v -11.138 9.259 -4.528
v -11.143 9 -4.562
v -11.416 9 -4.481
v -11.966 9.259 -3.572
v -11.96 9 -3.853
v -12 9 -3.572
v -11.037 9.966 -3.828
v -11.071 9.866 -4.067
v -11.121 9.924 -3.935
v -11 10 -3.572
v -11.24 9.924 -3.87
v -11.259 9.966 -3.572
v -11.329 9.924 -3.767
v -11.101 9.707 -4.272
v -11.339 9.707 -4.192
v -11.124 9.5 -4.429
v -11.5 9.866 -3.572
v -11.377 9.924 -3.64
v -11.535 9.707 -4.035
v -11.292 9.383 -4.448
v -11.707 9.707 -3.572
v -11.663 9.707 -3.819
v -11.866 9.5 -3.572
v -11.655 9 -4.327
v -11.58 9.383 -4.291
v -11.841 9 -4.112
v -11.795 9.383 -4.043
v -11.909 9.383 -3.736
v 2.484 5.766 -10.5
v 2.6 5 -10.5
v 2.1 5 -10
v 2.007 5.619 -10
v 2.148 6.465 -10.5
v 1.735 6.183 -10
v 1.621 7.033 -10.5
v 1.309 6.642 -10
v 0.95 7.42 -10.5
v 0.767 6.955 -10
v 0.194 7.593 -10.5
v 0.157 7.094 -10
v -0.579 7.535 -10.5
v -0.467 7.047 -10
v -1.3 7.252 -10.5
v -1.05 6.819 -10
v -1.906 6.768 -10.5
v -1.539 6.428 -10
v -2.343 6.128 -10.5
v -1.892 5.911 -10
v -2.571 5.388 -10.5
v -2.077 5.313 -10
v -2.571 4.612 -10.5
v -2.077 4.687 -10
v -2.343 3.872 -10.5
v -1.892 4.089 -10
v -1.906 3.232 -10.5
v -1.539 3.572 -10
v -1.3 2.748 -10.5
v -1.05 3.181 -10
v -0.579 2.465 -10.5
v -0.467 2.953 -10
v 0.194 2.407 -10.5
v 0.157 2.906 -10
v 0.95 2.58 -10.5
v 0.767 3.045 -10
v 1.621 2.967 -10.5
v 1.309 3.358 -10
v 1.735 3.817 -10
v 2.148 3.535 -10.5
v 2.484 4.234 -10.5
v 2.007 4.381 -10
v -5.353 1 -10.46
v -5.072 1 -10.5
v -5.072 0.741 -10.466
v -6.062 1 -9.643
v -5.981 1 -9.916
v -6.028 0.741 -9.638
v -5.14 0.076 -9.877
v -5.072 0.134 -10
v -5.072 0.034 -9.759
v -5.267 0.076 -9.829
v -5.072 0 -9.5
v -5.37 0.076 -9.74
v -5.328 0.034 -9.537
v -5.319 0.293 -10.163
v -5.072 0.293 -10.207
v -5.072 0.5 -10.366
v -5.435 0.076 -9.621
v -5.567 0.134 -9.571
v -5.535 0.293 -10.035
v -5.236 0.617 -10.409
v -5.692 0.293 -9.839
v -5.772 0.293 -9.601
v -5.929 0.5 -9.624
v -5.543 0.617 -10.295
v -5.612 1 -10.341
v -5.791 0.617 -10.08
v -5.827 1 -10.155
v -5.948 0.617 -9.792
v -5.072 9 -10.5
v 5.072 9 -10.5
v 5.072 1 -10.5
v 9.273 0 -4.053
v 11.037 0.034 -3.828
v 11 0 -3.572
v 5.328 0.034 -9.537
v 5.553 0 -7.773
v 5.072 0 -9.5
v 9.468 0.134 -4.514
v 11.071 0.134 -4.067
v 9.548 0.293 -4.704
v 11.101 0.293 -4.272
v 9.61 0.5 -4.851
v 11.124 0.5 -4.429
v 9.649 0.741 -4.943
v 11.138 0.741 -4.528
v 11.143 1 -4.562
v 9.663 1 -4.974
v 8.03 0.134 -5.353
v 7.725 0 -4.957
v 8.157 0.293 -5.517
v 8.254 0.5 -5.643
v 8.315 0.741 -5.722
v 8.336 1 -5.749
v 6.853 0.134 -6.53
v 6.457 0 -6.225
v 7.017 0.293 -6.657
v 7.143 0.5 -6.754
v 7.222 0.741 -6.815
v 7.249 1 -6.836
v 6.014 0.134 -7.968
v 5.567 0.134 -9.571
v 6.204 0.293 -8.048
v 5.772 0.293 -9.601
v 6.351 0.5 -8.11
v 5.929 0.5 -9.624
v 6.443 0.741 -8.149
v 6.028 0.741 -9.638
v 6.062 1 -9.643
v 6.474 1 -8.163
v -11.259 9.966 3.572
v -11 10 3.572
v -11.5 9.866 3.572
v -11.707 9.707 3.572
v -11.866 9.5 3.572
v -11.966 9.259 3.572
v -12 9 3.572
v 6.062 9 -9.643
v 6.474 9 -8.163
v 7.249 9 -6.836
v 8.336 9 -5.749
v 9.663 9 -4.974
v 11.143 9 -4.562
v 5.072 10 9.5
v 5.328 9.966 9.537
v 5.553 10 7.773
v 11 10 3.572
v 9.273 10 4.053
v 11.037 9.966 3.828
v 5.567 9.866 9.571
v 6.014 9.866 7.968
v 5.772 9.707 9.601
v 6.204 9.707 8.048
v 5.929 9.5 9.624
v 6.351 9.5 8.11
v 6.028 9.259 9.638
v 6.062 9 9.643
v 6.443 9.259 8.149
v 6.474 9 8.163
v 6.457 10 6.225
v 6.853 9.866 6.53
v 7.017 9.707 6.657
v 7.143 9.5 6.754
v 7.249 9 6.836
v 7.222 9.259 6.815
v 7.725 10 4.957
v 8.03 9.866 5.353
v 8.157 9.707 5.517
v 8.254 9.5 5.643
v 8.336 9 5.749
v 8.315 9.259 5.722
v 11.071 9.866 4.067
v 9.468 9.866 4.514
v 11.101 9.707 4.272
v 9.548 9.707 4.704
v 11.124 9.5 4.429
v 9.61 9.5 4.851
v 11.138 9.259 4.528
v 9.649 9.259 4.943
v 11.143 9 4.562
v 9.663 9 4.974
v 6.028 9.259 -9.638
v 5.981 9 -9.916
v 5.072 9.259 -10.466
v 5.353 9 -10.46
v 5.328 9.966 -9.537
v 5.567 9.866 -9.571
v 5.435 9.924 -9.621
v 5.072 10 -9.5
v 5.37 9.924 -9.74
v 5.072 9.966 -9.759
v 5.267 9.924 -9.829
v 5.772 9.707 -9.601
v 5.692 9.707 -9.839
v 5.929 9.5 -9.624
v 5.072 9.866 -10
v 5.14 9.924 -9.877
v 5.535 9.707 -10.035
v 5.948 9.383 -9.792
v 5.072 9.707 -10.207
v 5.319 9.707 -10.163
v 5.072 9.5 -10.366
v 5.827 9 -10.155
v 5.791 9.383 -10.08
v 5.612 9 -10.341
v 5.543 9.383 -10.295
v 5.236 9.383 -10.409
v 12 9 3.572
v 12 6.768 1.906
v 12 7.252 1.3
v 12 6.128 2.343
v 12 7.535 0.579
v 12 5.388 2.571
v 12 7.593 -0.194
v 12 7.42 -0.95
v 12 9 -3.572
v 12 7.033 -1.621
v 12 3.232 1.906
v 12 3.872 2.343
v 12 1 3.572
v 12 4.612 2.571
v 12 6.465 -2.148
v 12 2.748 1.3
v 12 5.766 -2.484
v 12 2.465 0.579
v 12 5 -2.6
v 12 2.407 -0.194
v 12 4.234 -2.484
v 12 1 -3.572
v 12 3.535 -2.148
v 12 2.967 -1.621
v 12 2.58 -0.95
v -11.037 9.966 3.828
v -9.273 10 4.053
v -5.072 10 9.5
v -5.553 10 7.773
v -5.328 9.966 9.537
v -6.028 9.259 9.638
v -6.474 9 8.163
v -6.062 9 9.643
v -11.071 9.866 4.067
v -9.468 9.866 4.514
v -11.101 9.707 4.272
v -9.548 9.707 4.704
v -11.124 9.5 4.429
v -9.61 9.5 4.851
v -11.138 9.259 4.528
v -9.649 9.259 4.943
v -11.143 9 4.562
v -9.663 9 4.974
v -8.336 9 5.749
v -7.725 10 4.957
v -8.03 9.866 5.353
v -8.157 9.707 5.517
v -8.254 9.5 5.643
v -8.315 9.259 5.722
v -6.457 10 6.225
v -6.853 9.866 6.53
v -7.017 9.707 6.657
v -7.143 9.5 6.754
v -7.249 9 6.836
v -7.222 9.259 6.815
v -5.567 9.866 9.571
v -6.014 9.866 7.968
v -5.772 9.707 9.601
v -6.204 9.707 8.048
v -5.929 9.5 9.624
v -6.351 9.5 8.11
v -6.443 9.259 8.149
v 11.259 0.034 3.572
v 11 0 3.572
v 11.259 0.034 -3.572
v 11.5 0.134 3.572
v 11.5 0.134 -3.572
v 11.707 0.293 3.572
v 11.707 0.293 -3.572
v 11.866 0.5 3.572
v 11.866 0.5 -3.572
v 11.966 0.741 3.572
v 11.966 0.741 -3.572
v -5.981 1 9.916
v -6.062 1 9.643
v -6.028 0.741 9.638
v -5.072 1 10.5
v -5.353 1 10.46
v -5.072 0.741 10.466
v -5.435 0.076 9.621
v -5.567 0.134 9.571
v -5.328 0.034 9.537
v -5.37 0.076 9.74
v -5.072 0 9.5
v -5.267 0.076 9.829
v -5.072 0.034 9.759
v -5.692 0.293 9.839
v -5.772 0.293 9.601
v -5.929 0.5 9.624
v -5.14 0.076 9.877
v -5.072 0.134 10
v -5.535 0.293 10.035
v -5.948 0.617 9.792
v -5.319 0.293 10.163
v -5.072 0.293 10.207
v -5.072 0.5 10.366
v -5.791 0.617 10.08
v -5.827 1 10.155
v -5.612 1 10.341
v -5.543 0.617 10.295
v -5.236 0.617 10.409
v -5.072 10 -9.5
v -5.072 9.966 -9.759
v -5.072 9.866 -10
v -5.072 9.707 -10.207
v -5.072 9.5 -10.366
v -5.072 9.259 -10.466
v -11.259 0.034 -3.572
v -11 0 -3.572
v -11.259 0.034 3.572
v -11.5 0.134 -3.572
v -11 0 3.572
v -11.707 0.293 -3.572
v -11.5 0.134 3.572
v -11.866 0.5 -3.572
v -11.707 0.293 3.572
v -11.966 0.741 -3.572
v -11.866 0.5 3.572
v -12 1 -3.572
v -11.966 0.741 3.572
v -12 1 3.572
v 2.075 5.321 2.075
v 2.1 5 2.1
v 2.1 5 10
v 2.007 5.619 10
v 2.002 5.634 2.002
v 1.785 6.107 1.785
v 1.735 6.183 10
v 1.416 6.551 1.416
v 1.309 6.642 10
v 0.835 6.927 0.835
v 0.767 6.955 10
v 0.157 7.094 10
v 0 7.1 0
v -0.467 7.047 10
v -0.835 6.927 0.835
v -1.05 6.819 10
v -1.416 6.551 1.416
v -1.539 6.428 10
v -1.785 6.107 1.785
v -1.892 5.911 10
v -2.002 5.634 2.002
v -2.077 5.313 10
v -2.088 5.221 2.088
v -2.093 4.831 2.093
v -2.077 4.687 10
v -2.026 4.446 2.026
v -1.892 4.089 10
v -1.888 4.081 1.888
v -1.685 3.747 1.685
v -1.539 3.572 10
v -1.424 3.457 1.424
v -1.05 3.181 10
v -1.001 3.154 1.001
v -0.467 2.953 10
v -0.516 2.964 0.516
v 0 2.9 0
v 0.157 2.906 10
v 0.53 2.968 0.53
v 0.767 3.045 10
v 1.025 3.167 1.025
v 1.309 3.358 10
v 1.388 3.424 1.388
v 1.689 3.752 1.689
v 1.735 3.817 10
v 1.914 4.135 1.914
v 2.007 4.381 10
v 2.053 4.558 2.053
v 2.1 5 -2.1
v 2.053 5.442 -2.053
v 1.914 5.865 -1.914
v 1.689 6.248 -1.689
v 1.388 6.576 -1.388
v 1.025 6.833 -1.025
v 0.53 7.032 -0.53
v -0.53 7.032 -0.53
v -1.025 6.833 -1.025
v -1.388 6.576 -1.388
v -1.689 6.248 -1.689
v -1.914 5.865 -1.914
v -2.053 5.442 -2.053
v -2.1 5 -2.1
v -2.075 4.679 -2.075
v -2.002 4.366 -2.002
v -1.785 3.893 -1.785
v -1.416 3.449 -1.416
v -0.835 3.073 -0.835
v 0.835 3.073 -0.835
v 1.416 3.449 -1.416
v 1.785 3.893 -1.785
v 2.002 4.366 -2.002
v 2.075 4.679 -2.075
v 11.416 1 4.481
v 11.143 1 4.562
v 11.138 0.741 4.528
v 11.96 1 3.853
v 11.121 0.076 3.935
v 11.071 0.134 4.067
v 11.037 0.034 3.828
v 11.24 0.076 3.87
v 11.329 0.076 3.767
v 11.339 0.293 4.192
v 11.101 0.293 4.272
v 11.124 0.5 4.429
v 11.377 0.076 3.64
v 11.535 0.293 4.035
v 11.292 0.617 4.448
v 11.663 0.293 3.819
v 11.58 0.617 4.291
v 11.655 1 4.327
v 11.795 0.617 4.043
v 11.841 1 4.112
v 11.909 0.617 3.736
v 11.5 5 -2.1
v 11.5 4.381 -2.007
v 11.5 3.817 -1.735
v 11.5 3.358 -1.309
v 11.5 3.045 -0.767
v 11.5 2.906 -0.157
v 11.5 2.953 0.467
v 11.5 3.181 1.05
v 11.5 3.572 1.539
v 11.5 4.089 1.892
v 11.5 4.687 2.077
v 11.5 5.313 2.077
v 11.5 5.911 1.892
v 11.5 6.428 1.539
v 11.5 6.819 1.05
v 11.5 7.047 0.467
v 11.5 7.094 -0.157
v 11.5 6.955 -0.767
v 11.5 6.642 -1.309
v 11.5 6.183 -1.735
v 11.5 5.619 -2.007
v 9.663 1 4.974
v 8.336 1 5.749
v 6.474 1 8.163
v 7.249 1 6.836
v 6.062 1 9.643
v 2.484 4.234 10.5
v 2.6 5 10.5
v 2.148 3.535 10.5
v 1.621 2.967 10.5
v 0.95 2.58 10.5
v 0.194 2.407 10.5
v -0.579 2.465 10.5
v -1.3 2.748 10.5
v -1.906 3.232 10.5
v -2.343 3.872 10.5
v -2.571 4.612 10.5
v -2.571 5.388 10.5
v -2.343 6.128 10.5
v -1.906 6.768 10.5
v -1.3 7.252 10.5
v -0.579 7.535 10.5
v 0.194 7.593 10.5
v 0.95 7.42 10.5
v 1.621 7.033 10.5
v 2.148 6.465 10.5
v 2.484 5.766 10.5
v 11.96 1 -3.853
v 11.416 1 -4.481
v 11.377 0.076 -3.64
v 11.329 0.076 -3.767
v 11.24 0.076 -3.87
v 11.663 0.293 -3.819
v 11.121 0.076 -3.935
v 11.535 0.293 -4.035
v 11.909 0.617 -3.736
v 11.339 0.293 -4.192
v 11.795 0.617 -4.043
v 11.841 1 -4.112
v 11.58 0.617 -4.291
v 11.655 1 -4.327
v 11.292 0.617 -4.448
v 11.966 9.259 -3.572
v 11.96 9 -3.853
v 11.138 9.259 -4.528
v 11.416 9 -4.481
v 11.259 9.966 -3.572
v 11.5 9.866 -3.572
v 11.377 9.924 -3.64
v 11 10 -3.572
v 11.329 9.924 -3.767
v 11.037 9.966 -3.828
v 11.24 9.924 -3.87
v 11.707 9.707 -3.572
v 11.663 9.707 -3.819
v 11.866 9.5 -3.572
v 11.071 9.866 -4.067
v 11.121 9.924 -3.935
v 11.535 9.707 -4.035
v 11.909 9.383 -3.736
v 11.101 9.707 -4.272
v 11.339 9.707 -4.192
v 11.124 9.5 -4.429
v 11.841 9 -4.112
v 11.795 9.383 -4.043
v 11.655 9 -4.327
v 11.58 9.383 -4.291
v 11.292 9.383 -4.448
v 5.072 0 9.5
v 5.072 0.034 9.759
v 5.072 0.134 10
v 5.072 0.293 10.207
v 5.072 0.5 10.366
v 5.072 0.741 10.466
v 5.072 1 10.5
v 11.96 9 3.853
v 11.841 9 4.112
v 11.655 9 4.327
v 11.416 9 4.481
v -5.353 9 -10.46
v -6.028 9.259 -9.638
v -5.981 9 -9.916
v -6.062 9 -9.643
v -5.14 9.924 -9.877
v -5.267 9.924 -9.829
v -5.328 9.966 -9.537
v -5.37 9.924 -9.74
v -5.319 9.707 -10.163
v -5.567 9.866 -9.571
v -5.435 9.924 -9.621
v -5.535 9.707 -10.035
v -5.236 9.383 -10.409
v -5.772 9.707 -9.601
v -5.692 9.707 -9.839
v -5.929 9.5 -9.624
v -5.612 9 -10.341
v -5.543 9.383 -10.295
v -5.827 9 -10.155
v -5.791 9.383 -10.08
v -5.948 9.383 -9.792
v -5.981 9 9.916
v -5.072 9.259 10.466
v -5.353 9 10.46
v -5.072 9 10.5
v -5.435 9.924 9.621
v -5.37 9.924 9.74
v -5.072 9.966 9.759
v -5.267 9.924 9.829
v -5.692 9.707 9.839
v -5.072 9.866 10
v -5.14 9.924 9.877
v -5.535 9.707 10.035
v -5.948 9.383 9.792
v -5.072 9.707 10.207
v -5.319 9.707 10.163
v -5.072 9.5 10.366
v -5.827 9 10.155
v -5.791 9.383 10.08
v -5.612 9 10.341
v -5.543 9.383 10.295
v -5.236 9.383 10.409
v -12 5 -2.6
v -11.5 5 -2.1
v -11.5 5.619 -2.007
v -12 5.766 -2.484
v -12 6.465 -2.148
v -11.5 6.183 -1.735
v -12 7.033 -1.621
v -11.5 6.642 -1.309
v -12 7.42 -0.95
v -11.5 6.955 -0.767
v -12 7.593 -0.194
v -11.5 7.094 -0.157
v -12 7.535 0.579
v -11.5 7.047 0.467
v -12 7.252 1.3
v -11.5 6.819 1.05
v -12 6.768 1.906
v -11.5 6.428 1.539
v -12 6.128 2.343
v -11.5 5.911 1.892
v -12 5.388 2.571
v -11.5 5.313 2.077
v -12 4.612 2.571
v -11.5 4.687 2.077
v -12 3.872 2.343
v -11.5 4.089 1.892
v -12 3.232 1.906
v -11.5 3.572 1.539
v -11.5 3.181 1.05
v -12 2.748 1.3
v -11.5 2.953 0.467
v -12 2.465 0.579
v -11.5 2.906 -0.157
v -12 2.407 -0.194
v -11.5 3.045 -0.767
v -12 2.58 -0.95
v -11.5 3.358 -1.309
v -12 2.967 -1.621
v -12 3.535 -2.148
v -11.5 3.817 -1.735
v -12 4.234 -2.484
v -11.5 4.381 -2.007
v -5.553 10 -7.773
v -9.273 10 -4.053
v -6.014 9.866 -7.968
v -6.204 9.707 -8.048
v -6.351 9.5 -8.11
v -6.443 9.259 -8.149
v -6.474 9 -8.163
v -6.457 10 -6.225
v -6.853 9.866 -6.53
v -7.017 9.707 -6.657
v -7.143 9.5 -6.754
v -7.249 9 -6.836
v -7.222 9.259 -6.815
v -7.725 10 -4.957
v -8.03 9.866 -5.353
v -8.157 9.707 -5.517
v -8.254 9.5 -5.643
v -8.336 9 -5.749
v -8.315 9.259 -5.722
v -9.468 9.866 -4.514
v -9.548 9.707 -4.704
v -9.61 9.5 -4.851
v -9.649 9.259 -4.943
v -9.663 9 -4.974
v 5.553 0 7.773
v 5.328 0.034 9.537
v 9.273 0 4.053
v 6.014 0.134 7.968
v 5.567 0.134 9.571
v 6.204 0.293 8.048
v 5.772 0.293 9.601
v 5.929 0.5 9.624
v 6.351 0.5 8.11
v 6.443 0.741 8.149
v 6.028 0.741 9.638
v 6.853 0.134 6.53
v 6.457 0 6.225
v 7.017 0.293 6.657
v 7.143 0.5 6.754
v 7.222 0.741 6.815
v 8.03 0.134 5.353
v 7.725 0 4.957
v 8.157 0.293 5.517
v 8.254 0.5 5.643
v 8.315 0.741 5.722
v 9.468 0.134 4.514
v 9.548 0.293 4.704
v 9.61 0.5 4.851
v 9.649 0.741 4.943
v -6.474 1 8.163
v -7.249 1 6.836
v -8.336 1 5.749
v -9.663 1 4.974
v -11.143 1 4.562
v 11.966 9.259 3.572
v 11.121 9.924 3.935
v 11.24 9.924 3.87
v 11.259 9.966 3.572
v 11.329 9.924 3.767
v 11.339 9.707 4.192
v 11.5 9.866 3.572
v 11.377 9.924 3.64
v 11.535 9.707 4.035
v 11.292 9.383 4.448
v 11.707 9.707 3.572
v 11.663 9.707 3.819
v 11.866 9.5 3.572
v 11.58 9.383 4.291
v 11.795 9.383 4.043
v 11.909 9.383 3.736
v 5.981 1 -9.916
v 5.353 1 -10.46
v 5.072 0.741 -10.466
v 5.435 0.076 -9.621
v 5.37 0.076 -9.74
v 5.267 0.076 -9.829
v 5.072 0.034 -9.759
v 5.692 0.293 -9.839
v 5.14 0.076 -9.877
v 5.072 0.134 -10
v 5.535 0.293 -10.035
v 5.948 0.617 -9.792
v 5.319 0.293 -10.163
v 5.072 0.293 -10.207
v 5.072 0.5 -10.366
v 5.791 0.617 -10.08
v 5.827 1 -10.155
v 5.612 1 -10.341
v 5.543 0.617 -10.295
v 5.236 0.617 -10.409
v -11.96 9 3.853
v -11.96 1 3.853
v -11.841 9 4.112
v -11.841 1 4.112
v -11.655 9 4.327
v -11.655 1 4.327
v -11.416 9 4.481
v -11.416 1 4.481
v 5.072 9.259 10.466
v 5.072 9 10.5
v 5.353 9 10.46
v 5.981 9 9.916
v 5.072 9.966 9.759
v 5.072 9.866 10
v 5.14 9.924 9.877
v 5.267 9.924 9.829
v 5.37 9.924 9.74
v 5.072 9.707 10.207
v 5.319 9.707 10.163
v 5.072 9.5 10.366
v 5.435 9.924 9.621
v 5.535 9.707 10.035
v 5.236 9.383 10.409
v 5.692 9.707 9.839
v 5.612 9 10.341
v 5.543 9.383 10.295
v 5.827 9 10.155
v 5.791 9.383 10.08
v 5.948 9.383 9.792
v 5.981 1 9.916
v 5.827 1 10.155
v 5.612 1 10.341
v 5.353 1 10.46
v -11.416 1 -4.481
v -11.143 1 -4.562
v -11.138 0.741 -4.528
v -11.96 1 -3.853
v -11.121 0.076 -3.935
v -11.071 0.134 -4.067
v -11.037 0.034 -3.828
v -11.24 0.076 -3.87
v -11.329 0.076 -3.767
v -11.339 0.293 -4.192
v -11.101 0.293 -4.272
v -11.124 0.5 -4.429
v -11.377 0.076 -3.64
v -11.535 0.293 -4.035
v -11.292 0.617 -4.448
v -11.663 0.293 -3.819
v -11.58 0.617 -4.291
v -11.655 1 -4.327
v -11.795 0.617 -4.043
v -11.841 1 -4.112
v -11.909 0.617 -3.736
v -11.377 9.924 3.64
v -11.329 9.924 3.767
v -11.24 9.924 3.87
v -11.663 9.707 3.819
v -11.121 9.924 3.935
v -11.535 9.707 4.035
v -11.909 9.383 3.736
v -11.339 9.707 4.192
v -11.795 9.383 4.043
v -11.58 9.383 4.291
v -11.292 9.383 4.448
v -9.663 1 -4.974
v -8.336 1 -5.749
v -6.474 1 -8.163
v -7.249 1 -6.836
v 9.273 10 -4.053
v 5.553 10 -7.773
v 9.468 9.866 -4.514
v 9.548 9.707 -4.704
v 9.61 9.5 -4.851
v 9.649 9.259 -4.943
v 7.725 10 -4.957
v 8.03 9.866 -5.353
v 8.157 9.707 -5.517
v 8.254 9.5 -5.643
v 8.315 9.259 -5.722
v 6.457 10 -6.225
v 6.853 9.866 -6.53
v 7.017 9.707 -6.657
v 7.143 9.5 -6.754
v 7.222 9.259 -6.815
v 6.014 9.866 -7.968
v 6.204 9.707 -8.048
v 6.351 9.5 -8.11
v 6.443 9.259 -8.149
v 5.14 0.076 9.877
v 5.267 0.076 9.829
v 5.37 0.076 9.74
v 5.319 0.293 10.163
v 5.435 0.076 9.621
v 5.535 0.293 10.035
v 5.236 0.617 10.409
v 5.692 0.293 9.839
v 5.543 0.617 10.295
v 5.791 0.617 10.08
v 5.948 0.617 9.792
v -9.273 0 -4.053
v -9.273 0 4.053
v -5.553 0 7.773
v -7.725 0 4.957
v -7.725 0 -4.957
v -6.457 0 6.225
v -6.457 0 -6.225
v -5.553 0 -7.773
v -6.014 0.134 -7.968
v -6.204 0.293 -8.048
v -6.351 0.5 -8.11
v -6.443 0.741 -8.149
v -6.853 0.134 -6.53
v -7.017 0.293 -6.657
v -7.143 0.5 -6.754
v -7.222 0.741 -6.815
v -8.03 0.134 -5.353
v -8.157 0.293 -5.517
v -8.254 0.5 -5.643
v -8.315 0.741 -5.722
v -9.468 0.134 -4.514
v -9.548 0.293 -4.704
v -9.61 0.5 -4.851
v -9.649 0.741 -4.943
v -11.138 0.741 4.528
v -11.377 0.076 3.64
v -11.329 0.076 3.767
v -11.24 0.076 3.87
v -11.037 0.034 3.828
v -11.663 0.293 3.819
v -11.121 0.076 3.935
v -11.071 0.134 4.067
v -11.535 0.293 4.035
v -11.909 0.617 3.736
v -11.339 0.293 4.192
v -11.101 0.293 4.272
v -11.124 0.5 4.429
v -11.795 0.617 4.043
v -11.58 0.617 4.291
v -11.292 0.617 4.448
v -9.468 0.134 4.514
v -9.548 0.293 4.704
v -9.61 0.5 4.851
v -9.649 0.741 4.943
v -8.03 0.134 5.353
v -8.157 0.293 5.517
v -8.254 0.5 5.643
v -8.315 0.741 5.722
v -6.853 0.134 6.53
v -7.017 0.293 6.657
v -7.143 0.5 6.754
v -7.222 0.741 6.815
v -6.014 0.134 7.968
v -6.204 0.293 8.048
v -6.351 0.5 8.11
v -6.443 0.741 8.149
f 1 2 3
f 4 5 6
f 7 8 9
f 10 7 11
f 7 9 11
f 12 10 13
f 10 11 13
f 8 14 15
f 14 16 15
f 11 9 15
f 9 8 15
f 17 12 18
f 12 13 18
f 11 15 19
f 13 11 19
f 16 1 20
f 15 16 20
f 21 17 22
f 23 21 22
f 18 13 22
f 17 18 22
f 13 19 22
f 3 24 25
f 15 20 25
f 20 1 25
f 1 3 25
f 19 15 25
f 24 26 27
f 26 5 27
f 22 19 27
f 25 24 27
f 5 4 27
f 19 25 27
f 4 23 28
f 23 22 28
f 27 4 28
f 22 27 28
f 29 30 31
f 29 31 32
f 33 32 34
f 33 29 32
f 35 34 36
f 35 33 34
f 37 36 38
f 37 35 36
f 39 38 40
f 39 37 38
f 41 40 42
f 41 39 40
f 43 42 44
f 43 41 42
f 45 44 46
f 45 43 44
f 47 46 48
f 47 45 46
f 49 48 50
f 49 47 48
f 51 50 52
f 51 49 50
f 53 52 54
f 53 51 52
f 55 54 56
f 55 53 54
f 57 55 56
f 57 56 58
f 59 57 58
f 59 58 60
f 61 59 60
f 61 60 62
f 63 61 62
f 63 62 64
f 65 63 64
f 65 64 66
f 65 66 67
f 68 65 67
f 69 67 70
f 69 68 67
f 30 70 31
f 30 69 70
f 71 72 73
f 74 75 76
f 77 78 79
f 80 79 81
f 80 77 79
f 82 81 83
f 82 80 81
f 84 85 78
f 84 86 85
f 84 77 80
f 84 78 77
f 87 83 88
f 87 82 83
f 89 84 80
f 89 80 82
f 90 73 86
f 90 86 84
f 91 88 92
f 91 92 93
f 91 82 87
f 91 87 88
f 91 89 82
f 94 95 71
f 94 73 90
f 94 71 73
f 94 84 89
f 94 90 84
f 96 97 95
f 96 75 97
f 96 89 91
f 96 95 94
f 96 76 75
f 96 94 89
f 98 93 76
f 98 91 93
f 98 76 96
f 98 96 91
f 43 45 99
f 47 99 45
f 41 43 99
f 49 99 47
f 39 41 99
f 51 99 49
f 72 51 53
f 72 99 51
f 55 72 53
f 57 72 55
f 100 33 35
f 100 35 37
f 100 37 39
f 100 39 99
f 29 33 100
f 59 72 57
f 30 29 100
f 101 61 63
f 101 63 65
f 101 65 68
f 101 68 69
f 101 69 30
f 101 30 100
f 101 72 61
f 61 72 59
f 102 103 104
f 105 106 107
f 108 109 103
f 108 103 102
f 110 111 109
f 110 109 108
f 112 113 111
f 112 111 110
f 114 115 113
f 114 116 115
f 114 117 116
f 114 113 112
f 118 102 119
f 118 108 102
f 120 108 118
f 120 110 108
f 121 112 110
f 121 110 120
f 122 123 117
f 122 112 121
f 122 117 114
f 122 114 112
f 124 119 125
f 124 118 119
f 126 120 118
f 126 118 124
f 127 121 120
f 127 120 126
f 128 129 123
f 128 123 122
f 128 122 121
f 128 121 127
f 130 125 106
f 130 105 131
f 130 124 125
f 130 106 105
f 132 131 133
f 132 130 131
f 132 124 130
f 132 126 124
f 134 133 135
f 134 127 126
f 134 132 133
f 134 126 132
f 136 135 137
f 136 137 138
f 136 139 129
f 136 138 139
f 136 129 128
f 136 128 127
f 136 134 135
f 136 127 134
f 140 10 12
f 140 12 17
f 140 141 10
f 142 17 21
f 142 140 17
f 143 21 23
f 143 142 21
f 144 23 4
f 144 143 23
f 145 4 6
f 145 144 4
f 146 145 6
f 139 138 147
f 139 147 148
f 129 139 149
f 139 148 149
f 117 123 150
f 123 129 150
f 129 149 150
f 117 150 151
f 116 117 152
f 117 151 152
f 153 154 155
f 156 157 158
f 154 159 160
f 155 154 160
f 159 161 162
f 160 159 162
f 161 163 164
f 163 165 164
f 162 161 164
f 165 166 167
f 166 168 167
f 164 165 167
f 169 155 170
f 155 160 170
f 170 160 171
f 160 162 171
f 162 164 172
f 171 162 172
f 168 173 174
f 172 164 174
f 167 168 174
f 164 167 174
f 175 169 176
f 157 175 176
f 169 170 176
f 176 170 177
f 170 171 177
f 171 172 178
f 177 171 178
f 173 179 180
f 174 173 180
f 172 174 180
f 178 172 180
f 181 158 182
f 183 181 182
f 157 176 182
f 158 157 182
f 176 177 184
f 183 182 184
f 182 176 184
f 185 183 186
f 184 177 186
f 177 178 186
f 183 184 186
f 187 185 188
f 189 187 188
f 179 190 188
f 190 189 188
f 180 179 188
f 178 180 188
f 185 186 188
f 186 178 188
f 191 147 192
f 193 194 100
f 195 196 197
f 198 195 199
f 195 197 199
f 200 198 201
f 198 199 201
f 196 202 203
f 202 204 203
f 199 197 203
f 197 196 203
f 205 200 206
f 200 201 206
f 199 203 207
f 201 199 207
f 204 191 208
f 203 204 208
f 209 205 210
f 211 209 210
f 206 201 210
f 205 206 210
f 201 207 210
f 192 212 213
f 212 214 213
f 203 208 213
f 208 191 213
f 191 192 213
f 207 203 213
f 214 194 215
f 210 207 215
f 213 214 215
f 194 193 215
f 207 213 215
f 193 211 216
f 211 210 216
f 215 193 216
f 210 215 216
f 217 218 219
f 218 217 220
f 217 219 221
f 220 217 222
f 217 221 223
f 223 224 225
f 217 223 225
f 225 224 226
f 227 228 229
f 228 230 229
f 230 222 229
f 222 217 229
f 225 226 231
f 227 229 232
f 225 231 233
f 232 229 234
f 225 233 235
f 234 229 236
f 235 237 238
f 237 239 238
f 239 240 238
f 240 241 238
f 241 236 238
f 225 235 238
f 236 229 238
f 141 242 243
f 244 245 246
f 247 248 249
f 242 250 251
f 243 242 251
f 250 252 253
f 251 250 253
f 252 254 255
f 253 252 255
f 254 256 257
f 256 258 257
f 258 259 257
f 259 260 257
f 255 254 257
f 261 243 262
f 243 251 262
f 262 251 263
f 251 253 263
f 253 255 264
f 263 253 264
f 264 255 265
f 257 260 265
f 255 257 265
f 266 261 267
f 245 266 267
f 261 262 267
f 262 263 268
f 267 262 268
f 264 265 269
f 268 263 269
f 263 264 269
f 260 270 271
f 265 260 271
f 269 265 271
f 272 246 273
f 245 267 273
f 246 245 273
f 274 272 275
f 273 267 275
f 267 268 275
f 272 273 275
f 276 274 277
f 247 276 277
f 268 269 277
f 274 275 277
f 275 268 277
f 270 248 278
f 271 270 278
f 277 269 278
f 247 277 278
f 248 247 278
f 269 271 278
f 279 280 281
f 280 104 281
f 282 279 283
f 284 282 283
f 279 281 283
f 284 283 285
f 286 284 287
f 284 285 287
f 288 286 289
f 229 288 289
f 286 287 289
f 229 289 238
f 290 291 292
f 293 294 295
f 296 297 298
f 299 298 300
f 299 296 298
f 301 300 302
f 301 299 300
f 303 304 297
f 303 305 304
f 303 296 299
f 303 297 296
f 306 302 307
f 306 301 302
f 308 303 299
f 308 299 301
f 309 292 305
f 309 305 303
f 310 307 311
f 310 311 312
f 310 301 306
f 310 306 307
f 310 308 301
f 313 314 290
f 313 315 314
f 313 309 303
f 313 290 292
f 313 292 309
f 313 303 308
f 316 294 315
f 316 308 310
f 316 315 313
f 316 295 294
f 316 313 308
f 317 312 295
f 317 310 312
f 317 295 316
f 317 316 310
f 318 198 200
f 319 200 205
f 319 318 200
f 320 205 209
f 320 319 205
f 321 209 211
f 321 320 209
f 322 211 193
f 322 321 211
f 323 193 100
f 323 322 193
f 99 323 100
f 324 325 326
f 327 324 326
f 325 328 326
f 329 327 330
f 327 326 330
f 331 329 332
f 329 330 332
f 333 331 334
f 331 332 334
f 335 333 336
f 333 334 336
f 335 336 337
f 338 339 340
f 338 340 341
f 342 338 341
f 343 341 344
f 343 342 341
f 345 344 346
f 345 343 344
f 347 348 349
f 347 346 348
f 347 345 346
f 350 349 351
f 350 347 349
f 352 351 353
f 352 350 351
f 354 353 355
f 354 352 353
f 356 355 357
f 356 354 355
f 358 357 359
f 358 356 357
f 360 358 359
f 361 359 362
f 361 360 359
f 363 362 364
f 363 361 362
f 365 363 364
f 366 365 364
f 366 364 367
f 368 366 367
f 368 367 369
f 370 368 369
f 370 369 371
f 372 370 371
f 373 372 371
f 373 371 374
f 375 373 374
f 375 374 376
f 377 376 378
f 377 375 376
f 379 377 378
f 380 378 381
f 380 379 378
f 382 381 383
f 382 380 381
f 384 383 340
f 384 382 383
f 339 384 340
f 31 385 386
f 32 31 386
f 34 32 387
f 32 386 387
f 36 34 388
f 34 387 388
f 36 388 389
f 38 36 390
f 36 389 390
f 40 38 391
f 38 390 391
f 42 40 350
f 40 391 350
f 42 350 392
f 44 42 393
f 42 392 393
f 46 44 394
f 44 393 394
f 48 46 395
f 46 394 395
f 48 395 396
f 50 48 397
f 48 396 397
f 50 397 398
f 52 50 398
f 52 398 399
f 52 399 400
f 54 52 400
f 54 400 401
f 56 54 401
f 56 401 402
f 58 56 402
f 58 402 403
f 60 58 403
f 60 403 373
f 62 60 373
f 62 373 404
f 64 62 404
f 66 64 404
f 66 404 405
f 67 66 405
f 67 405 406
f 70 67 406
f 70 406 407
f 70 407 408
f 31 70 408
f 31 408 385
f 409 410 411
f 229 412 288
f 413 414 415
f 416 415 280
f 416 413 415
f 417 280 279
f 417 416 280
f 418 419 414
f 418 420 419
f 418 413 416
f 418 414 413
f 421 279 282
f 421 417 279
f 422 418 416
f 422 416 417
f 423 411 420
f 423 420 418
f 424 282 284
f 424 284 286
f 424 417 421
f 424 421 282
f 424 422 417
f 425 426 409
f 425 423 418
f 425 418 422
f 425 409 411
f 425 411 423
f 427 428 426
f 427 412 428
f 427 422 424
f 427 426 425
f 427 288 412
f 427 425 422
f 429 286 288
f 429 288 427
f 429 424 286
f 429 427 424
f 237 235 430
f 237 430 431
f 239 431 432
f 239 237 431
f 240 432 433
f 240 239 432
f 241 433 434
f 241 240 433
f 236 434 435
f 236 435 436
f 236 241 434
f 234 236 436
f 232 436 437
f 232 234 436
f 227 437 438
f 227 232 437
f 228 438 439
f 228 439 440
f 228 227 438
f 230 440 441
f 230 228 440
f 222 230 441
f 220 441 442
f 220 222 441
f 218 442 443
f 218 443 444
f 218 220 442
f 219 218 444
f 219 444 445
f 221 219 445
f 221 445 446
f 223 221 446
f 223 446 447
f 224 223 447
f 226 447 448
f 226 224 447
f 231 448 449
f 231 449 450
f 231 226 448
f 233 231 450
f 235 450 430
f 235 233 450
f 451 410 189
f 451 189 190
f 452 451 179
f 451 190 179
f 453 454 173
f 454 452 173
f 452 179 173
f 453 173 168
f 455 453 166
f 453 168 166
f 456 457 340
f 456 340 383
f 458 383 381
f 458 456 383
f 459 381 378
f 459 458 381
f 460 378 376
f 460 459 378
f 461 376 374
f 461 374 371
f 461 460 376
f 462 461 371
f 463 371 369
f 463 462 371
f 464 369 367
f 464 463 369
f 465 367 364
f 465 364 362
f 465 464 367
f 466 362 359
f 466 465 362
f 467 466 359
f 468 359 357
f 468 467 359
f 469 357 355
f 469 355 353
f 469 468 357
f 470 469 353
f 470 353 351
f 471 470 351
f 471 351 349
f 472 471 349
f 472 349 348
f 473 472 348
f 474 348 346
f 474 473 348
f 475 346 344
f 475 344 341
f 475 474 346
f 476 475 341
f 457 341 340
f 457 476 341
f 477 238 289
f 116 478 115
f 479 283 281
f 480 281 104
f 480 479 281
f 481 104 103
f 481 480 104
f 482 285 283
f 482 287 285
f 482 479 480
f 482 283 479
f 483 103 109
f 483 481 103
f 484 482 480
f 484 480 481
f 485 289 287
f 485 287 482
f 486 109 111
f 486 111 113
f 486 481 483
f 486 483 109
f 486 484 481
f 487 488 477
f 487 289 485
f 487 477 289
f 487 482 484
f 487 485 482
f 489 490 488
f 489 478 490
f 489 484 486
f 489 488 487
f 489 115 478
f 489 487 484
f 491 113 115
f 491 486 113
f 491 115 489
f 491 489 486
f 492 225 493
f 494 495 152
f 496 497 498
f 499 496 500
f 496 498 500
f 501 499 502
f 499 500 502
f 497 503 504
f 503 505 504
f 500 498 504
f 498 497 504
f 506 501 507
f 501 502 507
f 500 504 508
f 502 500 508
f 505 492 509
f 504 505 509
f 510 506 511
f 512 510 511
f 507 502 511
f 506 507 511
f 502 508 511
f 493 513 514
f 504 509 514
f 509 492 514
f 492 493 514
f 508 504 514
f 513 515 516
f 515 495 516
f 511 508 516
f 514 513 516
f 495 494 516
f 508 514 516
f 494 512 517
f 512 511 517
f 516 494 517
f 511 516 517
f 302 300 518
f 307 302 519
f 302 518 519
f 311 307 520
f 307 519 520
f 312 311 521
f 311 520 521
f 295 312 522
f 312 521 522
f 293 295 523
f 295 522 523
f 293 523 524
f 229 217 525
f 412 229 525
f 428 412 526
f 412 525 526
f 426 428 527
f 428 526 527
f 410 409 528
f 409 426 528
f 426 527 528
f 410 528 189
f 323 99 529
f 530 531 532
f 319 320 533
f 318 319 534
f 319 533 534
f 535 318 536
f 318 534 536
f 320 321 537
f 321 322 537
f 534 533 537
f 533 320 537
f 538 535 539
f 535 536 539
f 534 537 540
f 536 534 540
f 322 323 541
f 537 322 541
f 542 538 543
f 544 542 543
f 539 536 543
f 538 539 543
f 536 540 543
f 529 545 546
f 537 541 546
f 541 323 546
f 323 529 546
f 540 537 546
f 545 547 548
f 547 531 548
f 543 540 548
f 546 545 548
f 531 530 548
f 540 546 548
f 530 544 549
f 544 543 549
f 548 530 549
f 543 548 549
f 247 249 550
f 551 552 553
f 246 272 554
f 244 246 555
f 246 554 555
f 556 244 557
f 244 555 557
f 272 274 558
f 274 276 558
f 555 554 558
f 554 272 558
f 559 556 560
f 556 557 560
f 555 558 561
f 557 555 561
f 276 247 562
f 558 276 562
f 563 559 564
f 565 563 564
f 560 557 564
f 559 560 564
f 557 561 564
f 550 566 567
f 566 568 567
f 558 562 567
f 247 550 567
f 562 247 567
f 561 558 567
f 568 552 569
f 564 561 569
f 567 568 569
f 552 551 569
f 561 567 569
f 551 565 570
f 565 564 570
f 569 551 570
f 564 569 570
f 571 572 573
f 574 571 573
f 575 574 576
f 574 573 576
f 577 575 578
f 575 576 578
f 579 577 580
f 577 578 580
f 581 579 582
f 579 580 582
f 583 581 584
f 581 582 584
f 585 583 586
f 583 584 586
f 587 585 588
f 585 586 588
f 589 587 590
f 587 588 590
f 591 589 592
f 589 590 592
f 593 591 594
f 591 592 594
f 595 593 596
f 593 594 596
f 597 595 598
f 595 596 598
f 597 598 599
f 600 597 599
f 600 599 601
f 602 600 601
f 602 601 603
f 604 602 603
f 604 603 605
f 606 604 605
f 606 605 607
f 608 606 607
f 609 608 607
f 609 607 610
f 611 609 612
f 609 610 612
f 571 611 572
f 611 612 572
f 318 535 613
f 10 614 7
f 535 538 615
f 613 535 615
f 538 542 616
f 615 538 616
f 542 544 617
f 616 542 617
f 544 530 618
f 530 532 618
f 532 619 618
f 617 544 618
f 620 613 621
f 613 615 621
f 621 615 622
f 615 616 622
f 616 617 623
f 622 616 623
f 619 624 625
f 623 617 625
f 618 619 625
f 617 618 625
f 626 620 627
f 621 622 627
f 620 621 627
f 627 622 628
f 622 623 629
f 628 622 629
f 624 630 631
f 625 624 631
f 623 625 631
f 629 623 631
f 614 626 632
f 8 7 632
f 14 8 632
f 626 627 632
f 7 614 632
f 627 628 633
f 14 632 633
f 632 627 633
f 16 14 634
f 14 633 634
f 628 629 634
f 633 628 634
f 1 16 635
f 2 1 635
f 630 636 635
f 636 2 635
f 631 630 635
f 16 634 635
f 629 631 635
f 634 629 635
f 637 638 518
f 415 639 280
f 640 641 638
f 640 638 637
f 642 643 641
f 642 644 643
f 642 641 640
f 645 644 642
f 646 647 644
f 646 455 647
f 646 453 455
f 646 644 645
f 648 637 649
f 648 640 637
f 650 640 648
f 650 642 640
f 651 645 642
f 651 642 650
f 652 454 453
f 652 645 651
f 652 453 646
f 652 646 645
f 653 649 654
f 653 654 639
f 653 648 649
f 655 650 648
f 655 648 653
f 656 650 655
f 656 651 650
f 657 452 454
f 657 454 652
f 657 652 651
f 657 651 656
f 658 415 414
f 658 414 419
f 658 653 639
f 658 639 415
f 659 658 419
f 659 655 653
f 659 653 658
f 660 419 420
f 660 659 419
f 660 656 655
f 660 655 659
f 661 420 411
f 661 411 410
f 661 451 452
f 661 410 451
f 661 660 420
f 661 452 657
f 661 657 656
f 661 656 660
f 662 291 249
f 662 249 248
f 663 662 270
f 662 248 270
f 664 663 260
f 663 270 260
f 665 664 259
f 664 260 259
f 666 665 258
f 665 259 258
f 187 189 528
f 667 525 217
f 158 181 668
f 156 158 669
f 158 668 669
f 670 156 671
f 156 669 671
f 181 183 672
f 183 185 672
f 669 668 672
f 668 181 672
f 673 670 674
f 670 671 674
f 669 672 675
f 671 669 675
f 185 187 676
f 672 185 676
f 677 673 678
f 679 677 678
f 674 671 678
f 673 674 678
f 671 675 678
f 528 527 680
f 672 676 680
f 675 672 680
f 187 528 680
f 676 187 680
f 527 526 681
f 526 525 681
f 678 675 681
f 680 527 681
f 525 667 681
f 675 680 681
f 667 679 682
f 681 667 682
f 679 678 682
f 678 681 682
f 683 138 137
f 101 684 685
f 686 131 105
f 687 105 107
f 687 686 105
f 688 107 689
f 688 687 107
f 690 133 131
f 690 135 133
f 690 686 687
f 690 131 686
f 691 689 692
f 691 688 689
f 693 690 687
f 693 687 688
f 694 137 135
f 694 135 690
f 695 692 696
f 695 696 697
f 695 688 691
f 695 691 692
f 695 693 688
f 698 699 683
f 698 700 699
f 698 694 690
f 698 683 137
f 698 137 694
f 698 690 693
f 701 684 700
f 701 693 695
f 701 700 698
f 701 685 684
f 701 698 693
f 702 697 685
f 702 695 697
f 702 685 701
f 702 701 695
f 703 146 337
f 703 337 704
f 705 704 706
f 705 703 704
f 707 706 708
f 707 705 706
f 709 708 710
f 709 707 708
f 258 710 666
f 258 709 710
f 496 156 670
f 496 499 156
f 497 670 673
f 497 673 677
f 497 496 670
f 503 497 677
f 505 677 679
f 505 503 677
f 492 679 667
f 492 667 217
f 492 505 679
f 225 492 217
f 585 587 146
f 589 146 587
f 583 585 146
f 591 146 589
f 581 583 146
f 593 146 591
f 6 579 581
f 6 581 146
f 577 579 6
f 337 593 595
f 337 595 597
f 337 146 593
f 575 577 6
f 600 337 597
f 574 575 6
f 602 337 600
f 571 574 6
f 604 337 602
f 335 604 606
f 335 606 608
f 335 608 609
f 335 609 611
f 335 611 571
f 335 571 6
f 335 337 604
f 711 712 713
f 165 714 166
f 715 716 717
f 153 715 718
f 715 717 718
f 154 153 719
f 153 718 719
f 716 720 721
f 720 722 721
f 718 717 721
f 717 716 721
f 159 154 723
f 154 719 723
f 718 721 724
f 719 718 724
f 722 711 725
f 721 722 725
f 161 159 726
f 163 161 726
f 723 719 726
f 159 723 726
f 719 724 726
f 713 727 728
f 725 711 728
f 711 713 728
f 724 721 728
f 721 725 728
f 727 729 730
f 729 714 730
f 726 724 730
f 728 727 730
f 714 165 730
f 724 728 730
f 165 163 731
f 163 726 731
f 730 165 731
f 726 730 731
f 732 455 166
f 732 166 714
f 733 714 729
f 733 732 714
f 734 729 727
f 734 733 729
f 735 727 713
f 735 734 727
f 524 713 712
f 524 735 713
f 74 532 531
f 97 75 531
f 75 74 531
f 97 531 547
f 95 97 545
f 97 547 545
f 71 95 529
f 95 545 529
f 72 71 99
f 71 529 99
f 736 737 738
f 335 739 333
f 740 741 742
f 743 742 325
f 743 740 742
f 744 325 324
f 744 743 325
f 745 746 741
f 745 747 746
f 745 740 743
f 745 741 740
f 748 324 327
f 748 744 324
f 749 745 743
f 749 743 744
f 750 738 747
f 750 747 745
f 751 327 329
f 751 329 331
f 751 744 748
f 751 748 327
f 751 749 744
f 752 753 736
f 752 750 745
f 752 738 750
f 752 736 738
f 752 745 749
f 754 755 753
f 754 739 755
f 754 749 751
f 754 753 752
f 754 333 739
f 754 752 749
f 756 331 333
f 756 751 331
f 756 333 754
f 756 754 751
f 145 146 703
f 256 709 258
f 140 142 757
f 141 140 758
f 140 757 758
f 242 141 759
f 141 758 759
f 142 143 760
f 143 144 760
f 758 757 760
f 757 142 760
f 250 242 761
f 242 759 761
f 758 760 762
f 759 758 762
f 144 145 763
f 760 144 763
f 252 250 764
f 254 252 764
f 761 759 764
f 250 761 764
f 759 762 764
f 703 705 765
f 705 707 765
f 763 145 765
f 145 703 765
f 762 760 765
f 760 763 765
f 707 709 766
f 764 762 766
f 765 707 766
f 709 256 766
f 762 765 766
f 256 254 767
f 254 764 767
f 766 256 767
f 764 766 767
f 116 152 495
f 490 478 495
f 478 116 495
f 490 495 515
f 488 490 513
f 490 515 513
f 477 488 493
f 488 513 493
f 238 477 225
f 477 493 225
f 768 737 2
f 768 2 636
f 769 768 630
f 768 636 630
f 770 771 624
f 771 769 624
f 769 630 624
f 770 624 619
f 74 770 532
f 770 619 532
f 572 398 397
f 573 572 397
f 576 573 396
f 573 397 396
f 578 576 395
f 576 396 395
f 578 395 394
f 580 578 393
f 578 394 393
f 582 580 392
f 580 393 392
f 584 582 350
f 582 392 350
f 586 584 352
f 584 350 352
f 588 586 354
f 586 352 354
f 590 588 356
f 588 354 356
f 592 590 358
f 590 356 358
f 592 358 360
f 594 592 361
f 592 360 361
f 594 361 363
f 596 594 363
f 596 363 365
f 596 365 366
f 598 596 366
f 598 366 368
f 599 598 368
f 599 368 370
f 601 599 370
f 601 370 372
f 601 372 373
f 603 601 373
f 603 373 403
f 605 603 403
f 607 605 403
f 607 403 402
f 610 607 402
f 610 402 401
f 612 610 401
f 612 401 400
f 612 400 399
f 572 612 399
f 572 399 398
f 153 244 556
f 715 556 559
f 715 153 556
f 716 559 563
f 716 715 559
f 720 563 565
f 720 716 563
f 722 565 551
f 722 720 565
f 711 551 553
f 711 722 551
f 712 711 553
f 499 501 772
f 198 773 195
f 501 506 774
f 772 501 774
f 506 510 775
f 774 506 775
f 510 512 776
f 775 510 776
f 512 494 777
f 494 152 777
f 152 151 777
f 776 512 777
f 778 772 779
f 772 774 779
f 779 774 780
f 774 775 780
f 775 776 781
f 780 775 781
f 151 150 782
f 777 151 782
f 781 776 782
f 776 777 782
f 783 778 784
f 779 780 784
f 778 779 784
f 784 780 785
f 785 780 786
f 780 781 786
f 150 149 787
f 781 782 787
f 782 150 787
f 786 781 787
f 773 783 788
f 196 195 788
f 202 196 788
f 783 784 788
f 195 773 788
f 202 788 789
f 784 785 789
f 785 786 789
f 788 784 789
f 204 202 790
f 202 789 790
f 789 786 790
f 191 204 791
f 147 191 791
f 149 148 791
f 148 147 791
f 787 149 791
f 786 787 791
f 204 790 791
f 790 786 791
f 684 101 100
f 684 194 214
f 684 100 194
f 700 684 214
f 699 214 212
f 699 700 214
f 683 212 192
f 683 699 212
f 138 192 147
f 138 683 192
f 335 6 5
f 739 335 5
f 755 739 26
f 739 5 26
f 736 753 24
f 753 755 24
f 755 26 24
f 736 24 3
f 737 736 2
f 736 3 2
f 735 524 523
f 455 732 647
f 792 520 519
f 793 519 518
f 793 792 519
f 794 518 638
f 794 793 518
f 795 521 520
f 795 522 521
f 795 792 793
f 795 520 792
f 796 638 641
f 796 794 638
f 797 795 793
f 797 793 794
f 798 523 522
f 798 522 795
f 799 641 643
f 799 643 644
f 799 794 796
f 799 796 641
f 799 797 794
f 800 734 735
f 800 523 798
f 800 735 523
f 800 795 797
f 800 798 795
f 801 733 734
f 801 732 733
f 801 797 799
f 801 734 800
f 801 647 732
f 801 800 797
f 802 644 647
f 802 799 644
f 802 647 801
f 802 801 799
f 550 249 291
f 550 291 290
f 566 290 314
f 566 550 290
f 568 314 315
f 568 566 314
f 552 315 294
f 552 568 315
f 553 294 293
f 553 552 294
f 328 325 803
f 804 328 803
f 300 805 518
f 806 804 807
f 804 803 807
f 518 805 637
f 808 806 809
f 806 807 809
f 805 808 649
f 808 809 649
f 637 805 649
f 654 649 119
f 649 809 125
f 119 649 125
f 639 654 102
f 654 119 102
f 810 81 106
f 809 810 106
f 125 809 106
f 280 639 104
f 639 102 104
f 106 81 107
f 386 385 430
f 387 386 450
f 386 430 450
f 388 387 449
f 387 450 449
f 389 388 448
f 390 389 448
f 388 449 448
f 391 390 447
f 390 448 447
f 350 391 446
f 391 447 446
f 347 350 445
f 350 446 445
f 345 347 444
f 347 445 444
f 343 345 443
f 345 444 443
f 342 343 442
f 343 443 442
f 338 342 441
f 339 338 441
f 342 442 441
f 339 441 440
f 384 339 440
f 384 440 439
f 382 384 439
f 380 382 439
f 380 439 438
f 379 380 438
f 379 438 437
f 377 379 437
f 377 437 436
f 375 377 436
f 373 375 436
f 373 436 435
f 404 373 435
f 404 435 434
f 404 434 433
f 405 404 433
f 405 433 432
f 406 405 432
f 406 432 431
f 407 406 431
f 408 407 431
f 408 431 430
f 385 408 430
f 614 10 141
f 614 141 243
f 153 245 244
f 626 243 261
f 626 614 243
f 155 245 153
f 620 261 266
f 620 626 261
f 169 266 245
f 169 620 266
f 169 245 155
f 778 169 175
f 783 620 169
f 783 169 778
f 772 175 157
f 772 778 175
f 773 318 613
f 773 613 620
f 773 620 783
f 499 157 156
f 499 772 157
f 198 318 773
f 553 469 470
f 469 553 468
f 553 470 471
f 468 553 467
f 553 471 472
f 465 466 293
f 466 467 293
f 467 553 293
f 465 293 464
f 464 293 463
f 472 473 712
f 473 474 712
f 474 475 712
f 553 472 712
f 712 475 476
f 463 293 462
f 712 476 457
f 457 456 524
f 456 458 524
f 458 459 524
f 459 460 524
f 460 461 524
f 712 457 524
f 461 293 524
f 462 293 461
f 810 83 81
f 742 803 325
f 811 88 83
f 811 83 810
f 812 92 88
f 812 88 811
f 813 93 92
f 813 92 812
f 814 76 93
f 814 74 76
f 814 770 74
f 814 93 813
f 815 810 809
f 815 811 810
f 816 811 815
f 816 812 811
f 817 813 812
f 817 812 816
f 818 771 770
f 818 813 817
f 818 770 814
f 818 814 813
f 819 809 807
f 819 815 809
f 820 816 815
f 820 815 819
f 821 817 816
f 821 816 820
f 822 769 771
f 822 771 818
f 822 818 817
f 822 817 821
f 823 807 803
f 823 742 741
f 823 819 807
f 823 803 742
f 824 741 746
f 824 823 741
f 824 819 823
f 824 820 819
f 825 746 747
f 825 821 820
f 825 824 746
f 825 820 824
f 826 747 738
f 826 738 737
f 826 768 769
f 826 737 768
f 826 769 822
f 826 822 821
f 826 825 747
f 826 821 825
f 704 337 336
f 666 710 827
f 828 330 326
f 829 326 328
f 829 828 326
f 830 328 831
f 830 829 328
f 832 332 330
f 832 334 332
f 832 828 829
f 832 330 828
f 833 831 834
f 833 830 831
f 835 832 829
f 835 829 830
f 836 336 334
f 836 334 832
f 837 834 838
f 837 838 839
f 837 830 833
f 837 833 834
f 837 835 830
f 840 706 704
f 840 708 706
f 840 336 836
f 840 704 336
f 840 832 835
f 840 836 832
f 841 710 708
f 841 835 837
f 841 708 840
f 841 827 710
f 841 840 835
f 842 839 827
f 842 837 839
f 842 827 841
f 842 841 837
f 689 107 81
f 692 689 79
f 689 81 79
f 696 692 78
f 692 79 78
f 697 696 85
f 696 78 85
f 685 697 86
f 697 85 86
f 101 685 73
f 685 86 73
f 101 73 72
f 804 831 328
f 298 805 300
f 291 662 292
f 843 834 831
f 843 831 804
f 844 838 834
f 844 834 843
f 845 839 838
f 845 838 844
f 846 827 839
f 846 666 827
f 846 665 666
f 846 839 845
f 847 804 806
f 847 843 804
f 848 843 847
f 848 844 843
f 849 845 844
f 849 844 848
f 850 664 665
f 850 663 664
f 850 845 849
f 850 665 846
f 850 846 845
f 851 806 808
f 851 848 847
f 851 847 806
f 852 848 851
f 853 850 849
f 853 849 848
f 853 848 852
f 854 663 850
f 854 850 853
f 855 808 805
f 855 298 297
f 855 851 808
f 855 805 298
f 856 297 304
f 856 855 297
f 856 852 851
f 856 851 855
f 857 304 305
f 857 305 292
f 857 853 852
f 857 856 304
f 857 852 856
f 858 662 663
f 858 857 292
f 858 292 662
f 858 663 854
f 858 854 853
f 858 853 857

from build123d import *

# Parameters (mm, degrees)
SKIZZE1_W                            = 24
SKIZZE1_H                            = 21
AUFSATZ_LINEAR_AUSTRAGEN1_DEPTH      = 10
SKIZZE2_R                            = 2.1
SCHNITT_LINEAR_AUSTRAGEN1_DEPTH      = 20
SCHNITT_LINEAR_AUSTRAGEN1_DEPTH_BACK = 20
SKIZZE3_R                            = 2.1
SCHNITT_LINEAR_AUSTRAGEN2_DEPTH      = 20
SCHNITT_LINEAR_AUSTRAGEN2_DEPTH_BACK = 20
SKIZZE4_R                            = 6
SCHNITT_LINEAR_AUSTRAGEN3_DEPTH      = 10
VERRUNDUNG1_R                        = 1
VERRUNDUNG2_R                        = 1
FASE1_SIZE                           = 0.5


with BuildPart() as part:
    # Skizze1 → Aufsatz-Linear austragen1 (new body)
    with BuildSketch(Plane(origin=(0, 0, 0), x_dir=(1, 0, 0), z_dir=(0, 1, 0))):
        Rectangle(SKIZZE1_W, SKIZZE1_H)
    extrude(amount=AUFSATZ_LINEAR_AUSTRAGEN1_DEPTH)

    # Skizze2 → Schnitt-Linear austragen1 (cut, two sides)
    with BuildSketch(Plane(origin=(0, 0, 0), x_dir=(0, 0, -1), z_dir=(1, 0, 0))) as schnitt_linear_austragen1_sk:
        with Locations((0, 5)):
            Circle(SKIZZE2_R)
    extrude(amount=SCHNITT_LINEAR_AUSTRAGEN1_DEPTH, mode=Mode.SUBTRACT)
    extrude(schnitt_linear_austragen1_sk.sketch, amount=-SCHNITT_LINEAR_AUSTRAGEN1_DEPTH_BACK, mode=Mode.SUBTRACT)

    # Skizze3 → Schnitt-Linear austragen2 (cut, two sides)
    with BuildSketch(Plane.XY) as schnitt_linear_austragen2_sk:
        with Locations((0, 5)):
            Circle(SKIZZE3_R)
    extrude(amount=SCHNITT_LINEAR_AUSTRAGEN2_DEPTH, mode=Mode.SUBTRACT)
    extrude(schnitt_linear_austragen2_sk.sketch, amount=-SCHNITT_LINEAR_AUSTRAGEN2_DEPTH_BACK, mode=Mode.SUBTRACT)

    # Skizze4 → Schnitt-Linear austragen3 (cut)
    with BuildSketch(Plane(origin=(0, 10, 0), x_dir=(-1, 0, 0), z_dir=(0, 1, 0))):
        with Locations((12, -10.5)):
            Circle(SKIZZE4_R)
        with Locations((-12, -10.5)):
            Circle(SKIZZE4_R)
        with Locations((-12, 10.5)):
            Circle(SKIZZE4_R)
        with Locations((12, 10.5)):
            Circle(SKIZZE4_R)
    extrude(amount=-SCHNITT_LINEAR_AUSTRAGEN3_DEPTH, mode=Mode.SUBTRACT)

    # Verrundung1
    verrundung1_edges = [part.edges().sort_by_distance(p)[0] for p in [
        (-6, 5, -10.5),
        (-12, 5, -4.5),
        (6, 5, -10.5),
        (12, 5, -4.5),
        (6, 5, 10.5),
        (12, 5, 4.5),
        (-6, 5, 10.5),
        (-12, 5, 4.5),
    ]]
    fillet(verrundung1_edges, radius=VERRUNDUNG1_R)

    # Verrundung2
    verrundung2_edges = [part.edges().sort_by_distance(p)[0] for p in [
        (12, 10, 0),
        (12, 0, 0),
        (0, 0, 10.5),
        (-7.757359313, 0, 6.257359313),
        (-12, 0, 0),
        (-7.757359313, 0, -6.257359313),
        (0, 0, -10.5),
        (7.757359313, 0, -6.257359313),
        (7.757359313, 0, 6.257359313),
        (11.755928946, 0, -4.22645044),
        (5.72645044, 0, -10.255928946),
        (-5.72645044, 0, -10.255928946),
        (-11.755928946, 0, -4.22645044),
        (-11.755928946, 0, 4.22645044),
        (-5.72645044, 0, 10.255928946),
        (5.72645044, 0, 10.255928946),
        (11.755928946, 0, 4.22645044),
        (7.757359313, 10, 6.257359313),
        (-7.757359313, 10, 6.257359313),
        (0, 10, 10.5),
        (7.757359313, 10, -6.257359313),
        (0, 10, -10.5),
        (-7.757359313, 10, -6.257359313),
        (-12, 10, 0),
        (11.755928946, 10, -4.22645044),
        (5.72645044, 10, -10.255928946),
        (-5.72645044, 10, -10.255928946),
        (-11.755928946, 10, -4.22645044),
        (-11.755928946, 10, 4.22645044),
        (-5.72645044, 10, 10.255928946),
        (5.72645044, 10, 10.255928946),
        (11.755928946, 10, 4.22645044),
    ]]
    fillet(verrundung2_edges, radius=VERRUNDUNG2_R)

    # Fase1
    fase1_edges = [part.edges().sort_by_distance(p)[0] for p in [
        (-12, 5, 2.1),
        (12, 5, 2.1),
        (-2.1, 5, -10.5),
        (-2.1, 5, 10.5),
    ]]
    chamfer(fase1_edges, length=FASE1_SIZE)


solid = part.part
